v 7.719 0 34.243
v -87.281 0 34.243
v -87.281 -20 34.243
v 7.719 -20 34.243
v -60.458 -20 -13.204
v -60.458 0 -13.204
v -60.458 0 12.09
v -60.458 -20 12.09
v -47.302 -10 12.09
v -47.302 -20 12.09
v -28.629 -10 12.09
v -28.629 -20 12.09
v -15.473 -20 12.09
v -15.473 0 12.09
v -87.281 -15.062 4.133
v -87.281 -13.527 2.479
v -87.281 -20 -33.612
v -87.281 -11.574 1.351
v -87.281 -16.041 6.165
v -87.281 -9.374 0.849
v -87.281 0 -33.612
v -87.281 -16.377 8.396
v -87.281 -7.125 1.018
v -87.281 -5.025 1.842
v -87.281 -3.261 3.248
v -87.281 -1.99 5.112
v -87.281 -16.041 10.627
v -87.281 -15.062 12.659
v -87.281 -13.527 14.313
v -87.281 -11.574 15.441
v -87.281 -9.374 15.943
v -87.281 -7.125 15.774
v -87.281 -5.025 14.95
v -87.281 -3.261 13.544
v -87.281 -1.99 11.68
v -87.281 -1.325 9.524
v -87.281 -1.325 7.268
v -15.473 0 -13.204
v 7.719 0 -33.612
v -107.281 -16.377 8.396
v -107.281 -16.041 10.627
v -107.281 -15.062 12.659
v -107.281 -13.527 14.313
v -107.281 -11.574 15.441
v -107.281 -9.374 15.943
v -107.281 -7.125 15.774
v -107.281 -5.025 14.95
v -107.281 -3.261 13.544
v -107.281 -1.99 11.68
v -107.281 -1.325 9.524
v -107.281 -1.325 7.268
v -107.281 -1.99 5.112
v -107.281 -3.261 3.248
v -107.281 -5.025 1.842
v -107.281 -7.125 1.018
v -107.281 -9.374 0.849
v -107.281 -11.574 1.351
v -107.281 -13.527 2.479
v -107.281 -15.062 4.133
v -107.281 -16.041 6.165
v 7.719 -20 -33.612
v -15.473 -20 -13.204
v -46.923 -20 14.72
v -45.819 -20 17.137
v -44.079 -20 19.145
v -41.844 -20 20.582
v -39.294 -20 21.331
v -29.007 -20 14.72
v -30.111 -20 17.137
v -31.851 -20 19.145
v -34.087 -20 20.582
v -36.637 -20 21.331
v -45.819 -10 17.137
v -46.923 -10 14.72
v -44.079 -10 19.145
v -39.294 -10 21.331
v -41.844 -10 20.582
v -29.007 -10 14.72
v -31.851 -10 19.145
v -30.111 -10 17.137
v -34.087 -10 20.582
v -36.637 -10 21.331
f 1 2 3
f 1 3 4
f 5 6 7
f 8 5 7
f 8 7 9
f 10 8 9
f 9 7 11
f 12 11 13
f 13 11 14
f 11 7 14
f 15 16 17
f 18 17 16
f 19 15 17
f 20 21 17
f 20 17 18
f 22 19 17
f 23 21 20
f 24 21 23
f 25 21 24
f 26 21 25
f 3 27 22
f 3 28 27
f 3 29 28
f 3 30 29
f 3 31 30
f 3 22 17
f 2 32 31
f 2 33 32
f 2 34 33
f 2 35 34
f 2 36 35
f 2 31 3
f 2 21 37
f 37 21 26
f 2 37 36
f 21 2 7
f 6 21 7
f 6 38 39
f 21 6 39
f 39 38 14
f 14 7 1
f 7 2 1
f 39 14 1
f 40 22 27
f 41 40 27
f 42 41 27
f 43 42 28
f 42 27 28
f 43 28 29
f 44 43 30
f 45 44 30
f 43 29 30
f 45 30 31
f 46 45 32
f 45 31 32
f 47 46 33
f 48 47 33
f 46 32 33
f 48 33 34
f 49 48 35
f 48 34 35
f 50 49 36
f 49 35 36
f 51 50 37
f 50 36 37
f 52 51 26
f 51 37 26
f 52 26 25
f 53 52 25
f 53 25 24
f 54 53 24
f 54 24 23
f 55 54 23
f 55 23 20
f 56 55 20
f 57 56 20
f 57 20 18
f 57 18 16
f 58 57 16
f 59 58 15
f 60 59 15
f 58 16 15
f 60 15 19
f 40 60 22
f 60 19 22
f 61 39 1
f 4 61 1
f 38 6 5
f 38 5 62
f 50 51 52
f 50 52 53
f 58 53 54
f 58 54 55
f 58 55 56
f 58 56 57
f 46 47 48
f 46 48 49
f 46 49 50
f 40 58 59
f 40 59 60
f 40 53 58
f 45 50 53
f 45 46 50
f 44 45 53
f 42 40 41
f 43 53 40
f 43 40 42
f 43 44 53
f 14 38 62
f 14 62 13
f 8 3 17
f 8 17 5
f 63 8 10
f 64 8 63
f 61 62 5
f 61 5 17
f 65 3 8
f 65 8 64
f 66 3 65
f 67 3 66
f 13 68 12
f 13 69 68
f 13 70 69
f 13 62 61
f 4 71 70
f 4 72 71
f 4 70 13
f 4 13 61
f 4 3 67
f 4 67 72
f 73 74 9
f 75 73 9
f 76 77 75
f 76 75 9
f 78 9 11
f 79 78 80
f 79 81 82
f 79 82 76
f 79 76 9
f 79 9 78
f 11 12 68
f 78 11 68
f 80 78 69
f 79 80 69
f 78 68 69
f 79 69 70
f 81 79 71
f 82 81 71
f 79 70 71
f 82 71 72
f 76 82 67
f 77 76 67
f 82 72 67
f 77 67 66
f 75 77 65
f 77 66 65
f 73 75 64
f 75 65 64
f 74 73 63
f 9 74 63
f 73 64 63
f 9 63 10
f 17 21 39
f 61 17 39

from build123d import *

# Parameters (mm, degrees)
F0_W     = 95
F0_H     = 67.8552658787
F0_W_2   = 44.9852889642
F0_H_2   = 25.2932771593
F1_DEPTH = 20
F2_R     = 7.5681331321
F3_DEPTH = 20
F5_DEPTH = 10


with BuildPart() as f1:
    # F0 (on Front) → F1 (new body)
    with BuildSketch(Plane.XZ):
        with Locations((-39.7814000025, 0.315669924)):
            Rectangle(F0_W, F0_H)
        with Locations((-37.9652246557, -0.5571056452)):
            Rectangle(F0_W_2, F0_H_2, mode=Mode.SUBTRACT)
    extrude(amount=F1_DEPTH)

    # F2 (on face) → F3 (join)
    with BuildSketch(Plane(origin=(-87.2814000025, 0, 0), x_dir=(0, -1, 0), z_dir=(-1, 0, 0))):
        with Locations((8.808799088, 8.3959847689)):
            Circle(F2_R)
    extrude(amount=F3_DEPTH)

    # F4 (on face) → F5 (cut)
    with BuildSketch(Plane.XZ.offset(20)):
        with BuildLine():
            Line((-47.3015092245, 12.0895329345), (-28.628940087, 12.0895329345))
            ThreePointArc((-28.628940087, 12.0895329345), (-37.9652246557, 21.4258175032), (-47.3015092245, 12.0895329345))
        make_face()
    extrude(amount=-F5_DEPTH, mode=Mode.SUBTRACT)


solid = f1.part
